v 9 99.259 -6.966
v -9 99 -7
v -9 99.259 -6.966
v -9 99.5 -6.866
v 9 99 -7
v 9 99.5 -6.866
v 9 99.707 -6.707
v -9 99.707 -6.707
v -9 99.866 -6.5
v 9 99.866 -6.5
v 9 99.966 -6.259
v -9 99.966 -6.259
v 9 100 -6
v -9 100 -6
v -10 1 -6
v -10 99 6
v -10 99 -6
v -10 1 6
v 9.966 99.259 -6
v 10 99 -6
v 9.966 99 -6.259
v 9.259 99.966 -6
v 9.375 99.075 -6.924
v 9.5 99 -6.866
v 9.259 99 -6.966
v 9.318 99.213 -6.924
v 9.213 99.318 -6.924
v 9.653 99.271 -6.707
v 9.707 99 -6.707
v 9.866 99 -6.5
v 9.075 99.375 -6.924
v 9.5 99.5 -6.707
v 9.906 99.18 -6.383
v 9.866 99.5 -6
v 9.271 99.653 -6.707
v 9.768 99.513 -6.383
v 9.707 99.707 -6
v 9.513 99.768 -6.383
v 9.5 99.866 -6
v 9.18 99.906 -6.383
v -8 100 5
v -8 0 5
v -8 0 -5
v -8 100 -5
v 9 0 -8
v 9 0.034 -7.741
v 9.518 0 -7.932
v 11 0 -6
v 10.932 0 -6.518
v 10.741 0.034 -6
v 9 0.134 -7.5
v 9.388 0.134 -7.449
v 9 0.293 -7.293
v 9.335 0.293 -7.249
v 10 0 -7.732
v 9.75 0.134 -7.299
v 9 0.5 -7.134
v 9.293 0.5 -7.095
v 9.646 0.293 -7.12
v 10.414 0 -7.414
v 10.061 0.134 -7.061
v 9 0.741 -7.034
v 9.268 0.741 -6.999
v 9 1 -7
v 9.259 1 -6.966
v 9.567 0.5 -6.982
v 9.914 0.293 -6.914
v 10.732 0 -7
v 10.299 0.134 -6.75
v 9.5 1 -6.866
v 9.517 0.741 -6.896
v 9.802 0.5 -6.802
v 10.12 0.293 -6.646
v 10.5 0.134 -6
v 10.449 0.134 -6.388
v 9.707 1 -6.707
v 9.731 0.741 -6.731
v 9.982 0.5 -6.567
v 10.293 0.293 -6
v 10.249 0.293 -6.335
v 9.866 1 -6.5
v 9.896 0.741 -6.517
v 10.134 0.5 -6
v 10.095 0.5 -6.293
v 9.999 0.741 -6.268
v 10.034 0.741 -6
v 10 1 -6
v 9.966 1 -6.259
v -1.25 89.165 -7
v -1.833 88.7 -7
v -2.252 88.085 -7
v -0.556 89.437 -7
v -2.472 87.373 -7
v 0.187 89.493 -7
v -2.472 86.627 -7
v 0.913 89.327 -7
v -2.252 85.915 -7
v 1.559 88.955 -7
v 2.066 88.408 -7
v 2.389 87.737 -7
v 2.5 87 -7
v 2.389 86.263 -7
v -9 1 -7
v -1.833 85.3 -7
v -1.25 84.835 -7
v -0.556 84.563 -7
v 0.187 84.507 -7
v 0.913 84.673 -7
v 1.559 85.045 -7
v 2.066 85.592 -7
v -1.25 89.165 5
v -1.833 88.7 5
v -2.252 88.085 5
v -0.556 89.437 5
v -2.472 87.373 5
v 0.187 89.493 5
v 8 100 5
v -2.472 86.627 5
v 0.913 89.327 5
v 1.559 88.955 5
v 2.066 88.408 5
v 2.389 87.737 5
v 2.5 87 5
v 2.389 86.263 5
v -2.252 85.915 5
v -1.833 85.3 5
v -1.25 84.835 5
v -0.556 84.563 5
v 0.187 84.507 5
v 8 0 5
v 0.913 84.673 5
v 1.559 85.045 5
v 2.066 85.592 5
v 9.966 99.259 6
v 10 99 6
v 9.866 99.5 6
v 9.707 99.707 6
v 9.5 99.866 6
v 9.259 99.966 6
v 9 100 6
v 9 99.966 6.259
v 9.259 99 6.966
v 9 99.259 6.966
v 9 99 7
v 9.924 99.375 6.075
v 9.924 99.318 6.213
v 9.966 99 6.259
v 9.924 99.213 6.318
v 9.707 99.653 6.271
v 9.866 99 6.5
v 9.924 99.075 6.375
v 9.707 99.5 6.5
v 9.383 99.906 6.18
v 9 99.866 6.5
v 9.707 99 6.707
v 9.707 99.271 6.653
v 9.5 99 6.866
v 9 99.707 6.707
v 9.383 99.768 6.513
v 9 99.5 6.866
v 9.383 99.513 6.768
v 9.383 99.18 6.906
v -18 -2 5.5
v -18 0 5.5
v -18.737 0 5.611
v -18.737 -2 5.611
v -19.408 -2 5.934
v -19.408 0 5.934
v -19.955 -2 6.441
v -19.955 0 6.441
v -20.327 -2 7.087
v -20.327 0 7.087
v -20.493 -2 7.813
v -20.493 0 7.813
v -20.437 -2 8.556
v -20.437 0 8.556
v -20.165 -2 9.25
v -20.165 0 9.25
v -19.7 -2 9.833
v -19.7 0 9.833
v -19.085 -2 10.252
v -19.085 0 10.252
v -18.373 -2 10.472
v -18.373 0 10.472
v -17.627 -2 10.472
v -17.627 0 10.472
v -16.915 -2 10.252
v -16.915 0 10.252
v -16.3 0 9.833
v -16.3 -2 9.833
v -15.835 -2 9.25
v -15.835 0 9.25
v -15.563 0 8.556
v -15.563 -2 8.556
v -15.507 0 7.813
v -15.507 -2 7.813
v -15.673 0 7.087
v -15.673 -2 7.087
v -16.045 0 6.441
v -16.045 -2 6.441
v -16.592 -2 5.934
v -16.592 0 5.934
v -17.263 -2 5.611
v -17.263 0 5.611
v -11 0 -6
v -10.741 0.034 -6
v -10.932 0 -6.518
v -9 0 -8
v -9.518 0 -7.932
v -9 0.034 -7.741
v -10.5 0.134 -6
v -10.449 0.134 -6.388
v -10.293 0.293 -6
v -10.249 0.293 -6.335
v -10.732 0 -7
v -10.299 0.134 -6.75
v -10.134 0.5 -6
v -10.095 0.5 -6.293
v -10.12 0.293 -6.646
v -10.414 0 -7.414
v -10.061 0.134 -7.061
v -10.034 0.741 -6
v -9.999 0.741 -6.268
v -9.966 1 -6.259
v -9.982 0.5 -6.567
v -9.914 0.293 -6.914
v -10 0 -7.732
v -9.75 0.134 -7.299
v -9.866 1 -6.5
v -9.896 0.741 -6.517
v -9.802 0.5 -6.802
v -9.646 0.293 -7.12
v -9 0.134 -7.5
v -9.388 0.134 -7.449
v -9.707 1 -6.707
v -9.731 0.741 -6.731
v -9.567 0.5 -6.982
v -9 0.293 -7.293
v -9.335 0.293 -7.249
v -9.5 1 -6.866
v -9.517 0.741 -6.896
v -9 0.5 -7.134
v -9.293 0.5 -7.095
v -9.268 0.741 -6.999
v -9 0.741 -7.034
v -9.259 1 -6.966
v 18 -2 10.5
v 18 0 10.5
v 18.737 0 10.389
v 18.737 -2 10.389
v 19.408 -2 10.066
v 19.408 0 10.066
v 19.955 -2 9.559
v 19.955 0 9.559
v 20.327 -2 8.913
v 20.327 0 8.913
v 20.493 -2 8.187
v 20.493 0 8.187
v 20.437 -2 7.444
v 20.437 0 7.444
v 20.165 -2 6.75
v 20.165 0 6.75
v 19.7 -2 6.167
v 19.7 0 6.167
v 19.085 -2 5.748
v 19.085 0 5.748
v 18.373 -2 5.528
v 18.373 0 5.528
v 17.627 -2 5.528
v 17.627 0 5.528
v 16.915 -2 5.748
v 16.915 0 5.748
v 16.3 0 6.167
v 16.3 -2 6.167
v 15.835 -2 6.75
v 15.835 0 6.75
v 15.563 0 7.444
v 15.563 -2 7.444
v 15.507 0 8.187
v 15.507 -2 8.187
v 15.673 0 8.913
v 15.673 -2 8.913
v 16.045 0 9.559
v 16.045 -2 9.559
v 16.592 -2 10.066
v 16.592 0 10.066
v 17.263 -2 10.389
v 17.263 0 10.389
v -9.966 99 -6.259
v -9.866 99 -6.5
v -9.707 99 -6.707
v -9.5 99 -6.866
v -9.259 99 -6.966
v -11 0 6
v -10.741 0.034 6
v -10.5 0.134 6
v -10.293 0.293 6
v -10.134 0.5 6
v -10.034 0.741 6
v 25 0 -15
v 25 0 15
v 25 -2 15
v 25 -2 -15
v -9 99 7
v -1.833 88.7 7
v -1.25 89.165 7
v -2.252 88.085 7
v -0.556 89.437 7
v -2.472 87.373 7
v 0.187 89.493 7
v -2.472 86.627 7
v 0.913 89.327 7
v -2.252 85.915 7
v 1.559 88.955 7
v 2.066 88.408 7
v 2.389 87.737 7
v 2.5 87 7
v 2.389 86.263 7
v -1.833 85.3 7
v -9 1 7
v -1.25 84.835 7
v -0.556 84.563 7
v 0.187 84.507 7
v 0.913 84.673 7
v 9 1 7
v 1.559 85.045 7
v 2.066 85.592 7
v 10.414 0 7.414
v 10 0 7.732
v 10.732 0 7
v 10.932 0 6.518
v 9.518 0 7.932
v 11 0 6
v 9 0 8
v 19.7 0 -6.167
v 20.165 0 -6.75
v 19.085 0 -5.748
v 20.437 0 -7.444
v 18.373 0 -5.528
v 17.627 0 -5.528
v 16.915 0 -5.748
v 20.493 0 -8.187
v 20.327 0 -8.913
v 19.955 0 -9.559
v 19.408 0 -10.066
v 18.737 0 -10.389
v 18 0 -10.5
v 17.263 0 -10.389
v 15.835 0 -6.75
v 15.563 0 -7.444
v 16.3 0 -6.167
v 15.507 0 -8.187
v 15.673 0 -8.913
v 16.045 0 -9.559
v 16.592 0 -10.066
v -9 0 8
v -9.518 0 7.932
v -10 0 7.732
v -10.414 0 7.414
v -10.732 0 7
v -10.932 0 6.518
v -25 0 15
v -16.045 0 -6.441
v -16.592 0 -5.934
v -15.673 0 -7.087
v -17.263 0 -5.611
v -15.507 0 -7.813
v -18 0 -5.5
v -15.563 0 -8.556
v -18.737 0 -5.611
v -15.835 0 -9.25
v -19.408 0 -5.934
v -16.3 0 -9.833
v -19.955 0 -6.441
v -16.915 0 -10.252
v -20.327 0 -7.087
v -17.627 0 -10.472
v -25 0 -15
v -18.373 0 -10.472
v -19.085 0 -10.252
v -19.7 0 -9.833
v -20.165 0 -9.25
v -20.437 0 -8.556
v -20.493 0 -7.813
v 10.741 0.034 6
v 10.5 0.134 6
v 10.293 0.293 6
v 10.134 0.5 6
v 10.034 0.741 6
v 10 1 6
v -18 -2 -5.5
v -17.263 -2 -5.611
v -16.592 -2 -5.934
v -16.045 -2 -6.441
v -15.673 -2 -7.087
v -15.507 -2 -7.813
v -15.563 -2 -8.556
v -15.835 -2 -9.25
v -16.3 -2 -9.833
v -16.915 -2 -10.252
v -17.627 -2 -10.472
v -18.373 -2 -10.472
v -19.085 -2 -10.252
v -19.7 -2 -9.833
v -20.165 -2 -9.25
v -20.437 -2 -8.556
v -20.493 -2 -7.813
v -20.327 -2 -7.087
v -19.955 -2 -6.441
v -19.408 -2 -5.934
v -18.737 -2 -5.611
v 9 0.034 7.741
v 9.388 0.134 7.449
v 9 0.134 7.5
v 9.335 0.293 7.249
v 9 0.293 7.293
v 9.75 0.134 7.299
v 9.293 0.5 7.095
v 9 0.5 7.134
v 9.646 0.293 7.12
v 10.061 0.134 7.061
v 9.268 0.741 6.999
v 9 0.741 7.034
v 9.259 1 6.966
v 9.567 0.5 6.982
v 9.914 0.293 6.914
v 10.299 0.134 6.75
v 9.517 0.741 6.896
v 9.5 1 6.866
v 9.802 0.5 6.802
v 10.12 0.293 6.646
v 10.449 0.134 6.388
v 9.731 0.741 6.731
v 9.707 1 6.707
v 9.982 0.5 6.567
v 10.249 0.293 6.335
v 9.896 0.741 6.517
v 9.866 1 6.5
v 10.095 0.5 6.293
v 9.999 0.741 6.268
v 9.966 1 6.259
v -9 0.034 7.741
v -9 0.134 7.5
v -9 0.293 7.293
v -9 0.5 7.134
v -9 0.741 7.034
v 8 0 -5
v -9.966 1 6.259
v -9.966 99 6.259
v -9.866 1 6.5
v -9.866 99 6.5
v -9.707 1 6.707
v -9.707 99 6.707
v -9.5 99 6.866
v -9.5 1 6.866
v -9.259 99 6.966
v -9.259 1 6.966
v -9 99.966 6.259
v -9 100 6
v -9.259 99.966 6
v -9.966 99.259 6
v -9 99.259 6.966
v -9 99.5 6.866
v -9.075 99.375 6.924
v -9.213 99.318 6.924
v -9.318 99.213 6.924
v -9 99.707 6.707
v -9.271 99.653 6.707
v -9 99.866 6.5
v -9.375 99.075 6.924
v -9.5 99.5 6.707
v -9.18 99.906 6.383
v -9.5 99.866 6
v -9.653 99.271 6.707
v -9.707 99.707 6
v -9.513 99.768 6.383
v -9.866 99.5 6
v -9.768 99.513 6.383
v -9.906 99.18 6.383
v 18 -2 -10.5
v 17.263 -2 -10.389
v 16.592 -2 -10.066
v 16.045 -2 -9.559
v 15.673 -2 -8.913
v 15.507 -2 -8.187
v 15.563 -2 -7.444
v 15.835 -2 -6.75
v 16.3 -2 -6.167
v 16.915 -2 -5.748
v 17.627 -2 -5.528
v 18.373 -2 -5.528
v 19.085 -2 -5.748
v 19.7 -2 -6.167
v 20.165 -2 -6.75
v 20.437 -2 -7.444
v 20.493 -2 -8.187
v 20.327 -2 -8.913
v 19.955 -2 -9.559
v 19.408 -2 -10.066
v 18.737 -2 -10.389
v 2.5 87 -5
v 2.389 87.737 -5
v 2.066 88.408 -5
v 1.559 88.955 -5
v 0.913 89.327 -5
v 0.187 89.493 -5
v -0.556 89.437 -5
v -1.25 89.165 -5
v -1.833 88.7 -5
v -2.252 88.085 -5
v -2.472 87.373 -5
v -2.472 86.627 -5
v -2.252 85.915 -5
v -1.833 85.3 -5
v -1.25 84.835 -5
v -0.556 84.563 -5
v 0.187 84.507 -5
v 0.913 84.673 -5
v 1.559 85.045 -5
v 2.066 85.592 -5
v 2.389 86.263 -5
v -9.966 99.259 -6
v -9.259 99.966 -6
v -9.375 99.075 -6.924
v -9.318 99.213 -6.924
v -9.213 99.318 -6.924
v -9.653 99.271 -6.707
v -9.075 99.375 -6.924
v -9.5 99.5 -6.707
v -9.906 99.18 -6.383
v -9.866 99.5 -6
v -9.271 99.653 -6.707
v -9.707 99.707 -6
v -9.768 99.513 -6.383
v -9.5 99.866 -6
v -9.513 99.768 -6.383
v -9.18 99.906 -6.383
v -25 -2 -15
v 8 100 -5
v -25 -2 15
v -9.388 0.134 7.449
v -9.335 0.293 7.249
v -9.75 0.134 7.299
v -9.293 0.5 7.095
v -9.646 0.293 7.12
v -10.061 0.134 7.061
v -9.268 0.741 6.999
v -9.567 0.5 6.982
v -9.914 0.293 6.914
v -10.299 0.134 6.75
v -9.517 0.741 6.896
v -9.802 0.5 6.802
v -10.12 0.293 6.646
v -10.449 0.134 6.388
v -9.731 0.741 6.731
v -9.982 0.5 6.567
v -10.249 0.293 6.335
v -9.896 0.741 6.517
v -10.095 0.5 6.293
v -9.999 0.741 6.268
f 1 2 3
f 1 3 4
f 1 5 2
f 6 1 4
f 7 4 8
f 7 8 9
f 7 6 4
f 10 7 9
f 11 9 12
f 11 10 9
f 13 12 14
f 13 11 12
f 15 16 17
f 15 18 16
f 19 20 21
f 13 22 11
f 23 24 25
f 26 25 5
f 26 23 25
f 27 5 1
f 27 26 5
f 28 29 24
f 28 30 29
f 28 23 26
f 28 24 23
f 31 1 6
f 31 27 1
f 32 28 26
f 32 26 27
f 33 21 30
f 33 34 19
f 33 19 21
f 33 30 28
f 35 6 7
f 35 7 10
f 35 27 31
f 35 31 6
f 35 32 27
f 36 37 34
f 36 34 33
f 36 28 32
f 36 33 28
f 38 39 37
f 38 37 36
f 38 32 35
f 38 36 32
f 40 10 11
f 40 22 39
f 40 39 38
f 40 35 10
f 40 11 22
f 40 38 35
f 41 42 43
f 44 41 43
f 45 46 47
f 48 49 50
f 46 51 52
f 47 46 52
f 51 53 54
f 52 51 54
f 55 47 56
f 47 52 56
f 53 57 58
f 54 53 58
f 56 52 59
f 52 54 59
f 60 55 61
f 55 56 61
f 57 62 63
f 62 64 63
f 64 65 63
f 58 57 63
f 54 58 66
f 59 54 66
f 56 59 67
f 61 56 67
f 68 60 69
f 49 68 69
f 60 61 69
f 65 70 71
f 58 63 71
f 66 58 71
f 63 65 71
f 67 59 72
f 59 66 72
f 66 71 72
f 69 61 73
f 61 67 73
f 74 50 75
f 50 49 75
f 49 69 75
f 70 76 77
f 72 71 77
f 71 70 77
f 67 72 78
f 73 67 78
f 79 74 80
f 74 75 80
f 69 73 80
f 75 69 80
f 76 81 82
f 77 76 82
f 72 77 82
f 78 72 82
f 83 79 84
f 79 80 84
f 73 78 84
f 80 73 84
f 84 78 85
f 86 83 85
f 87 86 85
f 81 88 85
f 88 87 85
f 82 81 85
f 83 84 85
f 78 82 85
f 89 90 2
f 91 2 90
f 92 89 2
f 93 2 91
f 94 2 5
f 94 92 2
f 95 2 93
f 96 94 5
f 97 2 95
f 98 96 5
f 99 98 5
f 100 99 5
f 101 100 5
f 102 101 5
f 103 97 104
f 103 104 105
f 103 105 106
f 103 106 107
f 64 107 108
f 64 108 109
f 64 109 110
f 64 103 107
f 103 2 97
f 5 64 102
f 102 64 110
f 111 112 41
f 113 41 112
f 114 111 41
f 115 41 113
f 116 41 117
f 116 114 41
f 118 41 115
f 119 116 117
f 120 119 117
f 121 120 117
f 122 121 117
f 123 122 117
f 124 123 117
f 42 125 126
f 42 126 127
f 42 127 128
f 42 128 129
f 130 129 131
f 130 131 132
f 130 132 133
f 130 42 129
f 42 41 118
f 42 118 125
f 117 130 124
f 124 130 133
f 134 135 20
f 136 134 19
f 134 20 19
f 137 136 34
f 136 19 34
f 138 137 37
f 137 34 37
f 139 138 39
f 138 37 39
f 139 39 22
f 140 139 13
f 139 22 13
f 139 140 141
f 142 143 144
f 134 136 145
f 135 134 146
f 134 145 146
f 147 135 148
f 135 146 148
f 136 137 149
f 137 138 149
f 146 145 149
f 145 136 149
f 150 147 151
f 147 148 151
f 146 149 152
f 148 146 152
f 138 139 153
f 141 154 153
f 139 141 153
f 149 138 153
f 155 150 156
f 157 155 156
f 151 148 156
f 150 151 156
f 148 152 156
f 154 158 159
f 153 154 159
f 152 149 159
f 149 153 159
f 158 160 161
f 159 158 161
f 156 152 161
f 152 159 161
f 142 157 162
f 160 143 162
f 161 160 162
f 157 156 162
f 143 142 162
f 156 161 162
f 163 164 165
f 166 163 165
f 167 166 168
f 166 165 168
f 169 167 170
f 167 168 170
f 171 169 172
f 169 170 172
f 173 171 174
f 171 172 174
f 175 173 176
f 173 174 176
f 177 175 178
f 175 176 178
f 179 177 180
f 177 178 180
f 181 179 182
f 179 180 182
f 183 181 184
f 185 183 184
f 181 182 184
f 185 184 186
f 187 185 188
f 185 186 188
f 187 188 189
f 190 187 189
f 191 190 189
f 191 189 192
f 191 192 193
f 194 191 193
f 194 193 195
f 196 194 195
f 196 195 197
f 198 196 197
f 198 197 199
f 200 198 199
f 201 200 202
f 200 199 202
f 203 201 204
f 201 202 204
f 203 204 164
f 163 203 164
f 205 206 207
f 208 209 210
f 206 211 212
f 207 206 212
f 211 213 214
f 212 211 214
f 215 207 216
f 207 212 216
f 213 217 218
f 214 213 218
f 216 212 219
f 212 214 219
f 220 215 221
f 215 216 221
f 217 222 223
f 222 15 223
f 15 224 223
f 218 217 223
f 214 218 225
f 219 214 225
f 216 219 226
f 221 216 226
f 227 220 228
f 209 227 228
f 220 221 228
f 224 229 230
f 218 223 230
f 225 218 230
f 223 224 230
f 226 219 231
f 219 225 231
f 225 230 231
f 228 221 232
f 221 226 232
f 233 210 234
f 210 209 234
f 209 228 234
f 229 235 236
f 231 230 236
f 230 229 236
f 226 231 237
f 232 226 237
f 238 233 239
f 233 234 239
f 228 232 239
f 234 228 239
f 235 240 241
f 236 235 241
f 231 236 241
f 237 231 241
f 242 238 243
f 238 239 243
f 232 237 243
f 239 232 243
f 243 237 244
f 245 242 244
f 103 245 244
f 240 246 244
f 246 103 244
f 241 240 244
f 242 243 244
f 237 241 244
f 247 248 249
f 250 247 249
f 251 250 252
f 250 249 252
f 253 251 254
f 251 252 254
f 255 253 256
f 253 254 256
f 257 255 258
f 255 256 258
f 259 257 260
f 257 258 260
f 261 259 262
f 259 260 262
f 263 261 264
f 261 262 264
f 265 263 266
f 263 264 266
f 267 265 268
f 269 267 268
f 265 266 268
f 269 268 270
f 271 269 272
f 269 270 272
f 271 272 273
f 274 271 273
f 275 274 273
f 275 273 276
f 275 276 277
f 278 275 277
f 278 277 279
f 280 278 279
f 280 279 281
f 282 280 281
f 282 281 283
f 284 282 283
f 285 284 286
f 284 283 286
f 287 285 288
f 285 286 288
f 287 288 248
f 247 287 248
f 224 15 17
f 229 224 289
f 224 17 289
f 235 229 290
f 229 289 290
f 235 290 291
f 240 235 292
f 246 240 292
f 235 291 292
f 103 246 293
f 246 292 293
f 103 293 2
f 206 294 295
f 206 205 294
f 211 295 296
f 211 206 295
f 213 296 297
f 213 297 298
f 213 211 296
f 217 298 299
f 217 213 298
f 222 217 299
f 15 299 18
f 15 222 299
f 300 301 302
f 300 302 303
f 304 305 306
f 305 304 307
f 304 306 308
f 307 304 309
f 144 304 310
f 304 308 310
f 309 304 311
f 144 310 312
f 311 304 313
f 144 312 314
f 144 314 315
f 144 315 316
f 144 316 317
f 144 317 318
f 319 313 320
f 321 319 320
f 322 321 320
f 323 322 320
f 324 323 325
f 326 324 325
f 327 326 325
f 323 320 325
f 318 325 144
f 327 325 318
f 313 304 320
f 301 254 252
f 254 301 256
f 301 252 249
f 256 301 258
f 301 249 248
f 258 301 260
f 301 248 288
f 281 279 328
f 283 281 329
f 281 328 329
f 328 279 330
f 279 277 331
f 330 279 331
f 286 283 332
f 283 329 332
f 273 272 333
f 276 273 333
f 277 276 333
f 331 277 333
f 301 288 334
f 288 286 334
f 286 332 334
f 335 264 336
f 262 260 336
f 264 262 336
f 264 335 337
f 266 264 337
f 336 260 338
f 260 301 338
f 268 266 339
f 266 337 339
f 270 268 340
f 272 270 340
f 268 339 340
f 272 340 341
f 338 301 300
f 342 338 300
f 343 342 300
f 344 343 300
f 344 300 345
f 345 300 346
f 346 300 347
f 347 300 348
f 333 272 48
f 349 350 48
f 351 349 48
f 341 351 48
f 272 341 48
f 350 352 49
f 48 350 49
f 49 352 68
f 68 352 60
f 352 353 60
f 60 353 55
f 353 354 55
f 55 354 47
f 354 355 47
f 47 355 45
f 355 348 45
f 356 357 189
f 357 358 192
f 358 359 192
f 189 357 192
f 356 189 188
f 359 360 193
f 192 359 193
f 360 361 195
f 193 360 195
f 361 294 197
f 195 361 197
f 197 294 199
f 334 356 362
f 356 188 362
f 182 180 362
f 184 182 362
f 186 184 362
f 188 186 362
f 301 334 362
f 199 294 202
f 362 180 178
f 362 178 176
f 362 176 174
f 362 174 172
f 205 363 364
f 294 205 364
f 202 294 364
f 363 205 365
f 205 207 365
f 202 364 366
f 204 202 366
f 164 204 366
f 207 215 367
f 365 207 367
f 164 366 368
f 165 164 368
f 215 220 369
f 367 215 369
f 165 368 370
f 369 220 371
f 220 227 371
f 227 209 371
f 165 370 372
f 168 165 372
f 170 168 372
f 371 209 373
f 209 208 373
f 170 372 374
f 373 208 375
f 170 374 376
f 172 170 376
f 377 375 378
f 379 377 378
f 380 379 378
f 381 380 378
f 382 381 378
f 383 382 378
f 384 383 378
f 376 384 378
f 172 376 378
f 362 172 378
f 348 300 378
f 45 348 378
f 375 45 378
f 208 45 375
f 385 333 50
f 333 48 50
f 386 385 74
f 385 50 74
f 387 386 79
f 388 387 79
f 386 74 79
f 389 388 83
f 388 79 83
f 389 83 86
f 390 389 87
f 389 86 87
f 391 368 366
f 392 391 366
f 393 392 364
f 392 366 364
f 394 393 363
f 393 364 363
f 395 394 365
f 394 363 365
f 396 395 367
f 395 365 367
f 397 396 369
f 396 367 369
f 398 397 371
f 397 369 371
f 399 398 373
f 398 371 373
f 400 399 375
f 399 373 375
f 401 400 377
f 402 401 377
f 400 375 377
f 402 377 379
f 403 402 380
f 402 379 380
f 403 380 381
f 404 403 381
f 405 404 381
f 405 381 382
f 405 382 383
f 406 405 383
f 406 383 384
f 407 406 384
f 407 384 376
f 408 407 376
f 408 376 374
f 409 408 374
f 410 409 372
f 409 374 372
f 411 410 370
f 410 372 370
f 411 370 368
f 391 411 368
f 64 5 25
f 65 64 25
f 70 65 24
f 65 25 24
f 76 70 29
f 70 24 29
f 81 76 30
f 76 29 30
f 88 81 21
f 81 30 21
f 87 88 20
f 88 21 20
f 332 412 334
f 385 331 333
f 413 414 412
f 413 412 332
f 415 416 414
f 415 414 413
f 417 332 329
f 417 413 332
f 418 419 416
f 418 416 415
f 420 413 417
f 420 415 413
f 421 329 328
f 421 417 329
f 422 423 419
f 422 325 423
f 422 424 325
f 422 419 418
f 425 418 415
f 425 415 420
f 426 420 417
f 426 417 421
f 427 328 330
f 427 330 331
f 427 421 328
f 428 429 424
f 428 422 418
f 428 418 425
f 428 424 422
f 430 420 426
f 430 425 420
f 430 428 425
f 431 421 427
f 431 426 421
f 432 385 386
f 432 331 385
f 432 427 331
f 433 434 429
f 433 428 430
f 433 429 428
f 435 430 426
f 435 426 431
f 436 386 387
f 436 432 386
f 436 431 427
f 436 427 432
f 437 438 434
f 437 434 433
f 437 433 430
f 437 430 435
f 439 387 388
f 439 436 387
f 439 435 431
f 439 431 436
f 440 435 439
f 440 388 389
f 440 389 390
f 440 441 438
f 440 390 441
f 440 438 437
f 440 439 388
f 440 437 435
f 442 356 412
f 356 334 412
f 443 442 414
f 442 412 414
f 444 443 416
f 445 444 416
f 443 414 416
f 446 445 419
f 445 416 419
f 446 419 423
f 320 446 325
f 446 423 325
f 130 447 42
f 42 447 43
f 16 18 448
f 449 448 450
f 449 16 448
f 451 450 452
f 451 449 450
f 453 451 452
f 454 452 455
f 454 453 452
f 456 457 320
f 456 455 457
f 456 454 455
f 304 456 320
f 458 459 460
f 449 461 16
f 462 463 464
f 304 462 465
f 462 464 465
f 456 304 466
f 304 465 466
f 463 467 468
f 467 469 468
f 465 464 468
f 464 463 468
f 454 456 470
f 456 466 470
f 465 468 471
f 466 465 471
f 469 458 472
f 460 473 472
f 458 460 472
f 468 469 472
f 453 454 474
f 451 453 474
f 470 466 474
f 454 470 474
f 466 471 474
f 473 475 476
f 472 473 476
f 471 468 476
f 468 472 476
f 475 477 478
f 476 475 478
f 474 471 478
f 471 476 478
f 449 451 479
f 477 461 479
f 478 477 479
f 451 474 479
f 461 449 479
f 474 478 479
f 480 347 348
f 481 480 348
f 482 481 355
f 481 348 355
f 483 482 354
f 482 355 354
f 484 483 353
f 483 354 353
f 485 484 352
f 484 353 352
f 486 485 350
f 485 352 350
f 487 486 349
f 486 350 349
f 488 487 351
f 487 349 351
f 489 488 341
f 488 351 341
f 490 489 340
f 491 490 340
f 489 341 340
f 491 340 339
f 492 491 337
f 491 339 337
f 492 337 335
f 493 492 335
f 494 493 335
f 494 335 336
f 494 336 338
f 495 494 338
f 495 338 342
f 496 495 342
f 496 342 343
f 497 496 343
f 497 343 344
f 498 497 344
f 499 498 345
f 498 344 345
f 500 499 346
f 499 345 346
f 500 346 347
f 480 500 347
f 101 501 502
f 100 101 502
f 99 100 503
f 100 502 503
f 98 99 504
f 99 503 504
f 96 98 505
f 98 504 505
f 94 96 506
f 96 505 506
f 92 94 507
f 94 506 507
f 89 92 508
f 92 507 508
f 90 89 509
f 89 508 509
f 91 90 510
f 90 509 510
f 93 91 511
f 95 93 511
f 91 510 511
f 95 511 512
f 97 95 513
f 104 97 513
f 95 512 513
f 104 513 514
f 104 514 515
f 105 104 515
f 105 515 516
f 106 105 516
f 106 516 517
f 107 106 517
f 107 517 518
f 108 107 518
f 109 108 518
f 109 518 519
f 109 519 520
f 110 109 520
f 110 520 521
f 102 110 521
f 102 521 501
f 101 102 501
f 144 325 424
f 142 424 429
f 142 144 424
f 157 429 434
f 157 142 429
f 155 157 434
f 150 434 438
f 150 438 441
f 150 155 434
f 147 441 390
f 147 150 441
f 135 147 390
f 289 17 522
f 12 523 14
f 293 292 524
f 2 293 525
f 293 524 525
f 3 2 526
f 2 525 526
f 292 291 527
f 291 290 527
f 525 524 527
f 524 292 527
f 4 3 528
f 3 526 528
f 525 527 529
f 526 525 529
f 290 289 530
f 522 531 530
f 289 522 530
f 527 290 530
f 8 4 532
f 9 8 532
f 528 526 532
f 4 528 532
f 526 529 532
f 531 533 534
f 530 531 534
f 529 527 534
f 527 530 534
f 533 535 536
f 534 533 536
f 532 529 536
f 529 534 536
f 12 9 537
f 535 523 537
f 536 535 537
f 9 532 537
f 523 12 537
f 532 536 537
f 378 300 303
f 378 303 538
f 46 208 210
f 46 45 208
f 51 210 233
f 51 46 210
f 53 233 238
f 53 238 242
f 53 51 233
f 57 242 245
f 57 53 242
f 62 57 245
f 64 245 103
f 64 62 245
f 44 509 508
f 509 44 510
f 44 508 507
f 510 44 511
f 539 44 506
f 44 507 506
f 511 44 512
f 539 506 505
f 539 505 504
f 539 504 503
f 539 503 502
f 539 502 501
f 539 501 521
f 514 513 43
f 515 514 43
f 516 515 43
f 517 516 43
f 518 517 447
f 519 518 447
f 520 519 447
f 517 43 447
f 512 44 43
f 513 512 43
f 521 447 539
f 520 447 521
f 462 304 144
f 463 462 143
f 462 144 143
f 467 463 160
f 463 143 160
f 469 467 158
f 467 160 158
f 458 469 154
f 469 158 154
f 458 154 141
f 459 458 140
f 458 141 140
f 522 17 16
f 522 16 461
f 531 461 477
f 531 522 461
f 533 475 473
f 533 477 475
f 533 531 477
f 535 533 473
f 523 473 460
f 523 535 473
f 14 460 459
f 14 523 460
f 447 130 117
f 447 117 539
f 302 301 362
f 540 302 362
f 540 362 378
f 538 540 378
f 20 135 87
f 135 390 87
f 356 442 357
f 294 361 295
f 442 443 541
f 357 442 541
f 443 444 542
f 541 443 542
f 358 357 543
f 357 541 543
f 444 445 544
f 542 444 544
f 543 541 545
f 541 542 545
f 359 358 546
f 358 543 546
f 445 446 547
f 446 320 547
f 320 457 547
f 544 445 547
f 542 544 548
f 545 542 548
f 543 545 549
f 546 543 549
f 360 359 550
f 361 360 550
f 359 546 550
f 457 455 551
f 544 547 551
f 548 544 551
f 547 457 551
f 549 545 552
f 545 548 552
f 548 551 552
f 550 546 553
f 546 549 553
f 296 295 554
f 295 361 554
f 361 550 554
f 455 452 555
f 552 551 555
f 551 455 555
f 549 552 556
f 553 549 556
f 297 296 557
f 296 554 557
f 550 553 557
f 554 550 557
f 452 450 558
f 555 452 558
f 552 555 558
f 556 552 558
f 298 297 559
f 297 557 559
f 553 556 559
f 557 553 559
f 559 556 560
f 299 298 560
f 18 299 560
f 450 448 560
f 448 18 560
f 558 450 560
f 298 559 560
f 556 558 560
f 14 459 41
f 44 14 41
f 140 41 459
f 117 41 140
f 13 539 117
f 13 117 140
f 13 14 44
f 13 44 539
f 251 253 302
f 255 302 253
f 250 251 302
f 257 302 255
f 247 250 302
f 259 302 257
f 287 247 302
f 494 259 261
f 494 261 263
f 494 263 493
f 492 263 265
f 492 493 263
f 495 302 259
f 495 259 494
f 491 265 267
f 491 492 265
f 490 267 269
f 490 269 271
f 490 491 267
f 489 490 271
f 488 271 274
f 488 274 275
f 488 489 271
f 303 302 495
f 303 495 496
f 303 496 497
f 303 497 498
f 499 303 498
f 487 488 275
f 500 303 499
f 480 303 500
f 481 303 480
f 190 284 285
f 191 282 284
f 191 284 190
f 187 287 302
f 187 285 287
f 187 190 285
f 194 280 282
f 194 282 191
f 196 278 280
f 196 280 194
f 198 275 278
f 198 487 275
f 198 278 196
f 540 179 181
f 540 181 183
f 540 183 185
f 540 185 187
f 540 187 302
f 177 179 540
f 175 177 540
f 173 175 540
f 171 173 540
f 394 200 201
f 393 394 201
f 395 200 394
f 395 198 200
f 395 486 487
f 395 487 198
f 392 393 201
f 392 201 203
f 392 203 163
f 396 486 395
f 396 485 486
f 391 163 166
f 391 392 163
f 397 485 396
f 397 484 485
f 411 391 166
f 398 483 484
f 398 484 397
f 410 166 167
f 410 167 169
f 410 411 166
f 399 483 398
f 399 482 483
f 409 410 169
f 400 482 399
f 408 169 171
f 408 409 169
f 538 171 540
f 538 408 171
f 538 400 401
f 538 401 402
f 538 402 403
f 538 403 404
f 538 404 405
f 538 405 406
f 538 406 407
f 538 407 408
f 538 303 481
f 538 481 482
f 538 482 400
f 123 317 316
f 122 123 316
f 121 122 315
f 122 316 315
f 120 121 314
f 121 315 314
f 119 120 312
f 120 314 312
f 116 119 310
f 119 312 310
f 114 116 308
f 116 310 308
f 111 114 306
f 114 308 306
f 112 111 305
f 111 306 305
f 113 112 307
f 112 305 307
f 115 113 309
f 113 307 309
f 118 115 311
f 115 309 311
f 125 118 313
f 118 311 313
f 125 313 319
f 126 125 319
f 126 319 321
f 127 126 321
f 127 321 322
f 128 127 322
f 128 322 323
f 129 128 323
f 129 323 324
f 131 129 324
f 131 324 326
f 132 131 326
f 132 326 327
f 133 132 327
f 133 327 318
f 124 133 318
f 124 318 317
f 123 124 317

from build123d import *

# Parameters (mm, degrees)
SKETCH1_W           = 20
SKETCH1_H           = 14
SKETCH1_W_2         = 16
SKETCH1_H_2         = 10
BOSS_EXTRUDE1_DEPTH = 100
SKETCH2_W           = 50
SKETCH2_H           = 30
BOSS_EXTRUDE2_DEPTH = 2
SKETCH3_R           = 2.5
CUT_EXTRUDE1_DEPTH  = 2
SKETCH4_R           = 2.5
CUT_EXTRUDE2_DEPTH  = 106.399240984
FILLET1_R           = 1


with BuildPart() as part:
    # Sketch1 → Boss-Extrude1 (new body)
    with BuildSketch(Plane(origin=(0, 0, 0), x_dir=(1, 0, 0), z_dir=(0, 1, 0))):
        Rectangle(SKETCH1_W, SKETCH1_H)
        Rectangle(SKETCH1_W_2, SKETCH1_H_2, mode=Mode.SUBTRACT)
    extrude(amount=BOSS_EXTRUDE1_DEPTH)

    # Sketch2 → Boss-Extrude2 (add)
    with BuildSketch(Plane(origin=(0, 0, 0), x_dir=(-1, 0, 0), z_dir=(0, -1, 0))):
        Rectangle(SKETCH2_W, SKETCH2_H)
    extrude(amount=BOSS_EXTRUDE2_DEPTH)

    # Sketch3 → Cut-Extrude1 (cut)
    with BuildSketch(Plane(origin=(0, 0, 0), x_dir=(1, 0, 0), z_dir=(0, 1, 0))):
        with Locations(Location((18, -8, 0), (0, 0, 270))):
            Circle(SKETCH3_R)
        with Locations(Location((18, 8, 0), (0, 0, 90))):
            Circle(SKETCH3_R)
        with Locations(Location((-18, -8, 0), (0, 0, 90))):
            Circle(SKETCH3_R)
        with Locations(Location((-18, 8, 0), (0, 0, 270))):
            Circle(SKETCH3_R)
    extrude(amount=-CUT_EXTRUDE1_DEPTH, mode=Mode.SUBTRACT)

    # Sketch4 → Cut-Extrude2 (cut, through all)
    with BuildSketch(Plane.XY.offset(7)):
        with Locations((0, 87)):
            Circle(SKETCH4_R)
    extrude(amount=-CUT_EXTRUDE2_DEPTH, mode=Mode.SUBTRACT)

    # Fillet1
    fillet1_edges = [part.edges().sort_by_distance(p)[0] for p in [
        (-10, 100, 0),
        (0, 100, 7),
        (10, 100, 0),
        (0, 0, 7),
        (-10, 0, 0),
        (0, 0, -7),
        (10, 0, 0),
        (10, 50, 7),
        (-10, 50, 7),
        (-10, 50, -7),
        (10, 50, -7),
        (0, 100, -7),
    ]]
    fillet(fillet1_edges, radius=FILLET1_R)


solid = part.part
